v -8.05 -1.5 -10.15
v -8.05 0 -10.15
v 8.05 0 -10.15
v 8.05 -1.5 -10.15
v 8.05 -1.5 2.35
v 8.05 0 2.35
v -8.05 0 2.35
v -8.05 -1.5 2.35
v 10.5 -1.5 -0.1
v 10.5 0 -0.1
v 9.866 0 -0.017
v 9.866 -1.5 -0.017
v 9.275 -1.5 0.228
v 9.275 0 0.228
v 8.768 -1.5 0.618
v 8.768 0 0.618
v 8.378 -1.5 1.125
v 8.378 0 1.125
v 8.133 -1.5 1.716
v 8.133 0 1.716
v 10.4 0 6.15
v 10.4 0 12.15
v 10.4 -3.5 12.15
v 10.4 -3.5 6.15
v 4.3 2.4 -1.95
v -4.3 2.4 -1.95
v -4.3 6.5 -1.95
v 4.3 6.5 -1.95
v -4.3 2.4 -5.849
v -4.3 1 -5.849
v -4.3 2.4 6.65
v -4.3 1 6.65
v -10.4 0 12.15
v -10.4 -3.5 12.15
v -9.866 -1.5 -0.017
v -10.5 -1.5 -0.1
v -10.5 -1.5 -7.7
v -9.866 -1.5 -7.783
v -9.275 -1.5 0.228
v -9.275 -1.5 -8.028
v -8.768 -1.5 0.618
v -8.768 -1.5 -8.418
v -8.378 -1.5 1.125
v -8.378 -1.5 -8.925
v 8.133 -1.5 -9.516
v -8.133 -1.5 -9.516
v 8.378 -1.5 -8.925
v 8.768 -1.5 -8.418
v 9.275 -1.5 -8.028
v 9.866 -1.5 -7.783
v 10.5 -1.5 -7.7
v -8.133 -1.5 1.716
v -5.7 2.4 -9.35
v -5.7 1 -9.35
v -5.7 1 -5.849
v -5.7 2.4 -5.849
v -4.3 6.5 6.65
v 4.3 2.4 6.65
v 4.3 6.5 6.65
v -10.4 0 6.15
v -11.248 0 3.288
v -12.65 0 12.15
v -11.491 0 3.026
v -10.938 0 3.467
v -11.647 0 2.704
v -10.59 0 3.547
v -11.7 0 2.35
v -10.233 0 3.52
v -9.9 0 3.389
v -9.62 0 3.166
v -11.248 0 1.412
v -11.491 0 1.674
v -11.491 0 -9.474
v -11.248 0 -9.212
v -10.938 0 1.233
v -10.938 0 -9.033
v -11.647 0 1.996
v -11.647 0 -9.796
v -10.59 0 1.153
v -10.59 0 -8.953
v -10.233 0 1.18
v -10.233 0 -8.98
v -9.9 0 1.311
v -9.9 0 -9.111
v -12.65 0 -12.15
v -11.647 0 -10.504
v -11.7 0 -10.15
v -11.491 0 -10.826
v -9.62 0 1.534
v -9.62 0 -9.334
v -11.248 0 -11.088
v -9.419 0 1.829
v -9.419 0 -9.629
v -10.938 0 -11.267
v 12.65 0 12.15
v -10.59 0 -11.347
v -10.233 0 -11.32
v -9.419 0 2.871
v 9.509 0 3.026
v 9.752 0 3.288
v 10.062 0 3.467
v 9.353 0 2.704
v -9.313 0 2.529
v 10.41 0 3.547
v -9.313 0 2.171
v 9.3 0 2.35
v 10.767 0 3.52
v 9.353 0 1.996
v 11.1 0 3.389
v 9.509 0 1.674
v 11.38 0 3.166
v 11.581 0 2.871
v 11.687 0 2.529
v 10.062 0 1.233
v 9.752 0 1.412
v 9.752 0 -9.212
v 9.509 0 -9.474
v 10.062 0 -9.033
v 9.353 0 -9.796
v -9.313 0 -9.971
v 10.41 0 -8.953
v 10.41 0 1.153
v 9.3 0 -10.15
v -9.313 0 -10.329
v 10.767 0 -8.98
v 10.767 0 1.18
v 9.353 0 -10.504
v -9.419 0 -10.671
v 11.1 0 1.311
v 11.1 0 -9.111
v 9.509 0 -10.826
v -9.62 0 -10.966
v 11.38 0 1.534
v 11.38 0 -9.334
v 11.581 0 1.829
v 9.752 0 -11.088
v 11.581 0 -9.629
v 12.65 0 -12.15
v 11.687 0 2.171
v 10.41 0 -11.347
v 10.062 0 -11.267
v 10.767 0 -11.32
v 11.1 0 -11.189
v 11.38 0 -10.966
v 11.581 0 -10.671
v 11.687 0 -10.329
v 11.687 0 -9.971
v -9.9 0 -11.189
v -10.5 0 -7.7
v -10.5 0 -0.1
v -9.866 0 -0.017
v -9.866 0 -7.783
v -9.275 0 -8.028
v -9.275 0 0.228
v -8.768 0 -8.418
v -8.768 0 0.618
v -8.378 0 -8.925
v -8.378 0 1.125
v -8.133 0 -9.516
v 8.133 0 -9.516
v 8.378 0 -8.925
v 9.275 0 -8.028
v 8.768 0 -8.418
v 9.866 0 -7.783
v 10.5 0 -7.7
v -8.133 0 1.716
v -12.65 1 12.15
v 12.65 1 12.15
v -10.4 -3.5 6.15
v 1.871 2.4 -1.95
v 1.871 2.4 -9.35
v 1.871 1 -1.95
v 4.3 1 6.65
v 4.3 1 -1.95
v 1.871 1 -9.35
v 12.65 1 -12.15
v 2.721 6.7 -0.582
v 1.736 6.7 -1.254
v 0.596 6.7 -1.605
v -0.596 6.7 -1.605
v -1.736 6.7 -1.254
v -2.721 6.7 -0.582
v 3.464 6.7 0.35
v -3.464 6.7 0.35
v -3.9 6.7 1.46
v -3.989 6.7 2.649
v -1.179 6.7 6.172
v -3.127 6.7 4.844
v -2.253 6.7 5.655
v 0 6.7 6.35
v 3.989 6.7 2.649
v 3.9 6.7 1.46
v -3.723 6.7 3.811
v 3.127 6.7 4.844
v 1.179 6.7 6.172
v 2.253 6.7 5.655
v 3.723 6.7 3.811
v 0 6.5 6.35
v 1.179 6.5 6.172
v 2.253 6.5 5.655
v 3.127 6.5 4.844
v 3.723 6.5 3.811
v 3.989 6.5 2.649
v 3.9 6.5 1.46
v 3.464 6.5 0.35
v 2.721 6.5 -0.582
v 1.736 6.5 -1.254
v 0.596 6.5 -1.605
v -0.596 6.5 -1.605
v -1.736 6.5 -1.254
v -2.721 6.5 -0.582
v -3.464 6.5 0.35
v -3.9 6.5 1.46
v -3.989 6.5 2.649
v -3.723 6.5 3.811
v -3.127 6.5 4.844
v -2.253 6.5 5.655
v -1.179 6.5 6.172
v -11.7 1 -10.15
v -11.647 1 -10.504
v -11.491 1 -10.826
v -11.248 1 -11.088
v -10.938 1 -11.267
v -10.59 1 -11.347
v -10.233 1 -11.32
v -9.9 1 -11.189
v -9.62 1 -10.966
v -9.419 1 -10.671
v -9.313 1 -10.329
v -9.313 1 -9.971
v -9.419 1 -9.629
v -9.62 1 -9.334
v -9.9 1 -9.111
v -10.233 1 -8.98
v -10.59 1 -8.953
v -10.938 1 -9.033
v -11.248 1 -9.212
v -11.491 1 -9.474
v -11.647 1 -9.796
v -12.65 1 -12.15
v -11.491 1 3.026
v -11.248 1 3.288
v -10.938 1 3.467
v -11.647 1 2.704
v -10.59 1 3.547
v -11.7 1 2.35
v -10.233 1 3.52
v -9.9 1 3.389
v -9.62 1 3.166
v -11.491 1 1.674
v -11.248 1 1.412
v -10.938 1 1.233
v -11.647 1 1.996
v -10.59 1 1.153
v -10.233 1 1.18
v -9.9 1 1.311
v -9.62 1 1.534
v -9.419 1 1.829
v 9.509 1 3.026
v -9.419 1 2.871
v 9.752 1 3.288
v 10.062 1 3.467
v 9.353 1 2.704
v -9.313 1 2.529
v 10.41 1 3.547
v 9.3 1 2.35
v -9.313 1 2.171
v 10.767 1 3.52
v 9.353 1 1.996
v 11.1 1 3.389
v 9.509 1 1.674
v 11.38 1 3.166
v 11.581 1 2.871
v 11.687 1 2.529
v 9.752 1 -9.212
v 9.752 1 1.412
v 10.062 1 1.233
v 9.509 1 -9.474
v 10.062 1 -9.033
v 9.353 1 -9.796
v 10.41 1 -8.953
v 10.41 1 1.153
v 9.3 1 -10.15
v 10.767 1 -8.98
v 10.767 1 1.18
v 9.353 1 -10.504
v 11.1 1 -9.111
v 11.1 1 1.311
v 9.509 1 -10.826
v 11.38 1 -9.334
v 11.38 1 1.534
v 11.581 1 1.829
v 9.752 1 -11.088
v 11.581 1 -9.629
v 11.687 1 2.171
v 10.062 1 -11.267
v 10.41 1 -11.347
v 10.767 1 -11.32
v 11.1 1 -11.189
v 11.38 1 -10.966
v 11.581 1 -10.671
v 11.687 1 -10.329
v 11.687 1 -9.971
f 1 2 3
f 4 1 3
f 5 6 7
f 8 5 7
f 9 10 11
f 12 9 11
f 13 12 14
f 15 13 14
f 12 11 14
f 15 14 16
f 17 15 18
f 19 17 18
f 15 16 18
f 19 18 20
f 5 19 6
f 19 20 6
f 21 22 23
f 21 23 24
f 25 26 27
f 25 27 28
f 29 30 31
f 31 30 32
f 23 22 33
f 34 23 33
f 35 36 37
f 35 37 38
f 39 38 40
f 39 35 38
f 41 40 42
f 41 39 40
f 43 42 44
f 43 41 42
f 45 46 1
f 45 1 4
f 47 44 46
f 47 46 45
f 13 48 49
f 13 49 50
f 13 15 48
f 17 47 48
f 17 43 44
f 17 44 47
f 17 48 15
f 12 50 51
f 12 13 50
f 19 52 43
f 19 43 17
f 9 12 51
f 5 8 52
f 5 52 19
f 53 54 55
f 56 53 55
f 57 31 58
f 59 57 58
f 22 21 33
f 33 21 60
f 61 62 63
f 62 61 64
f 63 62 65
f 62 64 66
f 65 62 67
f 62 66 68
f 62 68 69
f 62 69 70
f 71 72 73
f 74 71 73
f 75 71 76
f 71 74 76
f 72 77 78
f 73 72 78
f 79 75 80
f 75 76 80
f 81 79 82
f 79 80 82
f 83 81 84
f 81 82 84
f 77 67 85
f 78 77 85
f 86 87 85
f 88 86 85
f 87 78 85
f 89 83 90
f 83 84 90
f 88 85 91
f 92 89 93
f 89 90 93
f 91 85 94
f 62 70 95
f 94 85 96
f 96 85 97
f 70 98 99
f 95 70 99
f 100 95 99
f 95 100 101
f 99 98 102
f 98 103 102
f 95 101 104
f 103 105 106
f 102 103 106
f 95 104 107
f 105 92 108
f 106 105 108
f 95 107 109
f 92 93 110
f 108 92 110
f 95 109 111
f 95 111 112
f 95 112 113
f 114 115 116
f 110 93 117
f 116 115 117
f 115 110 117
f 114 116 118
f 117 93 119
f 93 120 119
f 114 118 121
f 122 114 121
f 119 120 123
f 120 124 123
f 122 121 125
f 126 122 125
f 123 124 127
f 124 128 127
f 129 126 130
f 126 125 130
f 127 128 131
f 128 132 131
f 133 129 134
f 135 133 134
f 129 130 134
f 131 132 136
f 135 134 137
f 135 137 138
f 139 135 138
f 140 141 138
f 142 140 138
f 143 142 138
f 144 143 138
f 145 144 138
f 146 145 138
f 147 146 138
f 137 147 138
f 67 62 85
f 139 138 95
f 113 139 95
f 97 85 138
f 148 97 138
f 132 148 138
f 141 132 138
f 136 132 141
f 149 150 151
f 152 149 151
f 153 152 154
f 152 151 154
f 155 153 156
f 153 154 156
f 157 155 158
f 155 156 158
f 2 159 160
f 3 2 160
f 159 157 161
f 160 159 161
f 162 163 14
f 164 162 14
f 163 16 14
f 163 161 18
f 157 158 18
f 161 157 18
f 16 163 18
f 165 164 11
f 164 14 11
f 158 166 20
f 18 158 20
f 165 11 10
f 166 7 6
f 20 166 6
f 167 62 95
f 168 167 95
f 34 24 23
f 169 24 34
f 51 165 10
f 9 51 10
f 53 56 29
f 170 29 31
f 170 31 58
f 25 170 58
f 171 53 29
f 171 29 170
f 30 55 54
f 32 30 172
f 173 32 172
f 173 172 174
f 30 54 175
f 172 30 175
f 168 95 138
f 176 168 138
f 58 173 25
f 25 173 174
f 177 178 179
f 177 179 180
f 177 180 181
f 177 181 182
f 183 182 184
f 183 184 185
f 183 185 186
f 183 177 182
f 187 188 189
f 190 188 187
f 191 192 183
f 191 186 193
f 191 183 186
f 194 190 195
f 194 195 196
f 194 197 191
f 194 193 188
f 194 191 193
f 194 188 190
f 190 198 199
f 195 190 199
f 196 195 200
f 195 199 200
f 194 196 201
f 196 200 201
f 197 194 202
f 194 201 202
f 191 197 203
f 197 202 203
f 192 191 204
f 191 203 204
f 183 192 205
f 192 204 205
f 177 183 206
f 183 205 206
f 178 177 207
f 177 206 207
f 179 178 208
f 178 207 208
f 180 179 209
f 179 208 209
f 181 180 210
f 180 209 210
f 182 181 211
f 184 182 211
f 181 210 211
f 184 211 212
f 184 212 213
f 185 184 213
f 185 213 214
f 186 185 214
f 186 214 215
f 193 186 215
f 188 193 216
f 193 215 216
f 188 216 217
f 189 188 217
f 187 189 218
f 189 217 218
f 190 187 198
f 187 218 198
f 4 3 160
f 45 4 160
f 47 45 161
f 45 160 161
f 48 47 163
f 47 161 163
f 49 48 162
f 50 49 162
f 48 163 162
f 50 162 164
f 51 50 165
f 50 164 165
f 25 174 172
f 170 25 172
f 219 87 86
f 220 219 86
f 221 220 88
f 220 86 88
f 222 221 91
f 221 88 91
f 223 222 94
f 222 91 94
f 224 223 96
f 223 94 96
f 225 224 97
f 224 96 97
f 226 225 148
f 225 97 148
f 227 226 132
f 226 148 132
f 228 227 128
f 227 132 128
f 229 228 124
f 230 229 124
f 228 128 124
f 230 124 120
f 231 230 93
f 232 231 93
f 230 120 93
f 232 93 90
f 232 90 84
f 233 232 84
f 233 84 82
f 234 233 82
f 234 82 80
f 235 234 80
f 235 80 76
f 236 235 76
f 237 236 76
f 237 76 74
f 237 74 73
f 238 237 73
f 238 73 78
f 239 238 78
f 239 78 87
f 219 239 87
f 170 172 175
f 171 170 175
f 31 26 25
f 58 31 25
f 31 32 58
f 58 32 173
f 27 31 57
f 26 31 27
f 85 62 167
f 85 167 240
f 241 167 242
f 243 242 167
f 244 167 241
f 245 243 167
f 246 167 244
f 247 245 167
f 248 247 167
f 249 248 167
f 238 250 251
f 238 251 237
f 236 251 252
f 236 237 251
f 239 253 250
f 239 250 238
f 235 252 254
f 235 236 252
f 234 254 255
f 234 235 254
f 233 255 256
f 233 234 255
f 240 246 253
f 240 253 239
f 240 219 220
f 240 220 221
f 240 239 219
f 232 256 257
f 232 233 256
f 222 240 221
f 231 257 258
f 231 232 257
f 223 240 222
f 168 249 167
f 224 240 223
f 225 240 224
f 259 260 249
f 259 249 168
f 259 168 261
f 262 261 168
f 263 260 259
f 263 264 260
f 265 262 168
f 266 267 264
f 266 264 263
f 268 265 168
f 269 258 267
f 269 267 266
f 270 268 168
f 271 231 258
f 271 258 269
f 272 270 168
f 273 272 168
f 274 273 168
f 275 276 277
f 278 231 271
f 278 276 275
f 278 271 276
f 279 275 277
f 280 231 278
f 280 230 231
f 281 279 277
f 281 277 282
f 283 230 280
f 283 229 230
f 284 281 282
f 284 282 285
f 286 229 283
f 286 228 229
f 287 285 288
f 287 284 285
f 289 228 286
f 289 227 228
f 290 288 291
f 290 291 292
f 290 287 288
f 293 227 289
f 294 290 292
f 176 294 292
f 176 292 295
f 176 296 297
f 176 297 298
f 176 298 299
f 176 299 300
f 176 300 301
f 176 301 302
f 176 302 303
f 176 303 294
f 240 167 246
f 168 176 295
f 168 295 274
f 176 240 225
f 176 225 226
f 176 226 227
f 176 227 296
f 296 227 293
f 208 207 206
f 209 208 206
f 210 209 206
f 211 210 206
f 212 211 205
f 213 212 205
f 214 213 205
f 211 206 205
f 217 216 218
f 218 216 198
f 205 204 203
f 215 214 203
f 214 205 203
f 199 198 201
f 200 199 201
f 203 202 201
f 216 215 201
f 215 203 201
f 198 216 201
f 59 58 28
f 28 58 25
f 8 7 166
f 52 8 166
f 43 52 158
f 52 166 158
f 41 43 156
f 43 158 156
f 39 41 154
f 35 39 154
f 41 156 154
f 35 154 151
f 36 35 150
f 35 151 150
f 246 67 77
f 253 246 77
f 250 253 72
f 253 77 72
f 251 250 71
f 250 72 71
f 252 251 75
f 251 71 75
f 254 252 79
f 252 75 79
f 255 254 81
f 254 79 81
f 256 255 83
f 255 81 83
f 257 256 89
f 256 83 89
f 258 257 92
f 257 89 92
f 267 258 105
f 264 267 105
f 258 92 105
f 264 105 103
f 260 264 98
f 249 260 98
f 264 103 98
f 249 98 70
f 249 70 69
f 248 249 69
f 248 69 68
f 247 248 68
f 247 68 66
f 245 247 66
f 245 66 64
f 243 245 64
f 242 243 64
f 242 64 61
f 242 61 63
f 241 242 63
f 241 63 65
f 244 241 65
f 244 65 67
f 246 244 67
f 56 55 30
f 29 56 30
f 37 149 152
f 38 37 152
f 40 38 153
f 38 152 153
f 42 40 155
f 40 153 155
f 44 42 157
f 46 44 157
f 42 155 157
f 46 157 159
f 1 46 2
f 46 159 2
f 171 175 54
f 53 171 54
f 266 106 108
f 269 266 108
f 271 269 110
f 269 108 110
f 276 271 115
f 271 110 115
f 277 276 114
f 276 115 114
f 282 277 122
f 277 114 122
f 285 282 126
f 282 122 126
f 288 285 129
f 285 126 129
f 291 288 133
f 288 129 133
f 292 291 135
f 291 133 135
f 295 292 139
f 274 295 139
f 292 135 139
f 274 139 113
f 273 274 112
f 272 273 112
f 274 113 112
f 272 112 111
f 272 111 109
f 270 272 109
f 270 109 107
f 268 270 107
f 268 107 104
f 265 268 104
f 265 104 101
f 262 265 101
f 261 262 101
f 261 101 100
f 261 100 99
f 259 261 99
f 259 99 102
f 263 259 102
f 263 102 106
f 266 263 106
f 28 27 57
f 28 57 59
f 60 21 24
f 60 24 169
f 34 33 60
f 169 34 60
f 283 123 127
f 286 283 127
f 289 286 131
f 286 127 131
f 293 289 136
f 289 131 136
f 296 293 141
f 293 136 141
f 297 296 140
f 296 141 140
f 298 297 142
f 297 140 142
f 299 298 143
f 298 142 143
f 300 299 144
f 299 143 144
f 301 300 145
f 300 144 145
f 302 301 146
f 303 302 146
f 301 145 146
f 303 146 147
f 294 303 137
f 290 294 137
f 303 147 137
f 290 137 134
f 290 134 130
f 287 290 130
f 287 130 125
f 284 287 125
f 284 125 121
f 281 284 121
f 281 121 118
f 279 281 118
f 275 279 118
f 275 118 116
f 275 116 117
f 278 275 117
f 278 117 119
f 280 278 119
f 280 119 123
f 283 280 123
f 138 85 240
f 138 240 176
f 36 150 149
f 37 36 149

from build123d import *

# Parameters (mm, degrees)
ESQUISSE1_W        = 25.3
ESQUISSE1_H        = 24.3
BOSS_EXTRU_1_DEPTH = 1
D_GAGEMENT_M21_D   = 2.4
BOSS_EXTRU_2_DEPTH = 1.4
ESQUISSE5_W        = 8.6
ESQUISSE5_H        = 8.6
BOSS_EXTRU_3_DEPTH = 4.1
ESQUISSE6_R        = 4
BOSS_EXTRU_4_DEPTH = 0.2
ESQUISSE8_W        = 20.8
ESQUISSE8_H        = 6
BOSS_EXTRU_5_DEPTH = 3.5
BOSS_EXTRU_6_DEPTH = 1.5


with BuildPart() as part:
    # Esquisse1 → Boss.-Extru.1 (new body)
    with BuildSketch(Plane(origin=(0, 0, 0), x_dir=(1, 0, 0), z_dir=(0, 1, 0))):
        Rectangle(ESQUISSE1_W, ESQUISSE1_H)
    extrude(amount=BOSS_EXTRU_1_DEPTH)

    # Dégagement M21 (through all)
    with Locations(Plane(origin=(0, 1, 0), x_dir=(1, 0, 0), z_dir=(0, 1, 0))):
        with Locations((-10.5, 10.15), (10.5, 10.15), (-10.5, -2.35), (10.5, -2.35)):
            Hole(D_GAGEMENT_M21_D / 2)


with BuildPart() as body_2:
    # Esquisse4 → Boss.-Extru.2 (new body)
    with BuildSketch(Plane(origin=(0, 1, 0), x_dir=(1, 0, 0), z_dir=(0, 1, 0))):
        Polygon((-5.7, 9.35), (-5.7, 5.848572406), (-4.3, 5.848572406), (-4.3, -6.65), (4.3, -6.65), (4.3, 1.95), (1.870577592, 1.95), (1.870577592, 9.35), align=None)
    extrude(amount=BOSS_EXTRU_2_DEPTH)


with BuildPart() as body_3:
    # Esquisse5 → Boss.-Extru.3 (new body)
    with BuildSketch(Plane(origin=(0, 2.4, 0), x_dir=(1, 0, 0), z_dir=(0, 1, 0))):
        with Locations((0, -2.35)):
            Rectangle(ESQUISSE5_W, ESQUISSE5_H)
    extrude(amount=BOSS_EXTRU_3_DEPTH)


with BuildPart() as body_4:
    # Esquisse6 → Boss.-Extru.4 (new body)
    with BuildSketch(Plane(origin=(0, 6.5, 0), x_dir=(1, 0, 0), z_dir=(0, 1, 0))):
        with Locations(Location((0, -2.35, 0), (0, 0, 270))):
            Circle(ESQUISSE6_R)
    extrude(amount=BOSS_EXTRU_4_DEPTH)


with BuildPart() as body_5:
    # Esquisse8 → Boss.-Extru.5 (new body)
    with BuildSketch(Plane(origin=(0, 0, 0), x_dir=(-1, 0, 0), z_dir=(0, -1, 0))):
        with Locations((0, -9.15)):
            Rectangle(ESQUISSE8_W, ESQUISSE8_H)
    extrude(amount=BOSS_EXTRU_5_DEPTH)


with BuildPart() as body_6:
    # Esquisse9 → Boss.-Extru.6 (new body)
    with BuildSketch(Plane.XZ):
        with BuildLine():
            Line((-10.5, -0.1), (-10.5, -7.7))
            ThreePointArc((-10.5, -7.7), (-8.767588386, -8.417588386), (-8.05, -10.15))
            Line((-8.05, -10.15), (8.05, -10.15))
            ThreePointArc((8.05, -10.15), (8.767588386, -8.417588386), (10.5, -7.7))
            Line((10.5, -7.7), (10.5, -0.1))
            ThreePointArc((10.5, -0.1), (8.767588386, 0.617588386), (8.05, 2.35))
            Line((8.05, 2.35), (-8.05, 2.35))
            ThreePointArc((-8.05, 2.35), (-8.767588386, 0.617588386), (-10.5, -0.1))
        make_face()
    extrude(amount=BOSS_EXTRU_6_DEPTH)


solid = Compound([part.part, body_2.part, body_3.part, body_4.part, body_5.part, body_6.part])
